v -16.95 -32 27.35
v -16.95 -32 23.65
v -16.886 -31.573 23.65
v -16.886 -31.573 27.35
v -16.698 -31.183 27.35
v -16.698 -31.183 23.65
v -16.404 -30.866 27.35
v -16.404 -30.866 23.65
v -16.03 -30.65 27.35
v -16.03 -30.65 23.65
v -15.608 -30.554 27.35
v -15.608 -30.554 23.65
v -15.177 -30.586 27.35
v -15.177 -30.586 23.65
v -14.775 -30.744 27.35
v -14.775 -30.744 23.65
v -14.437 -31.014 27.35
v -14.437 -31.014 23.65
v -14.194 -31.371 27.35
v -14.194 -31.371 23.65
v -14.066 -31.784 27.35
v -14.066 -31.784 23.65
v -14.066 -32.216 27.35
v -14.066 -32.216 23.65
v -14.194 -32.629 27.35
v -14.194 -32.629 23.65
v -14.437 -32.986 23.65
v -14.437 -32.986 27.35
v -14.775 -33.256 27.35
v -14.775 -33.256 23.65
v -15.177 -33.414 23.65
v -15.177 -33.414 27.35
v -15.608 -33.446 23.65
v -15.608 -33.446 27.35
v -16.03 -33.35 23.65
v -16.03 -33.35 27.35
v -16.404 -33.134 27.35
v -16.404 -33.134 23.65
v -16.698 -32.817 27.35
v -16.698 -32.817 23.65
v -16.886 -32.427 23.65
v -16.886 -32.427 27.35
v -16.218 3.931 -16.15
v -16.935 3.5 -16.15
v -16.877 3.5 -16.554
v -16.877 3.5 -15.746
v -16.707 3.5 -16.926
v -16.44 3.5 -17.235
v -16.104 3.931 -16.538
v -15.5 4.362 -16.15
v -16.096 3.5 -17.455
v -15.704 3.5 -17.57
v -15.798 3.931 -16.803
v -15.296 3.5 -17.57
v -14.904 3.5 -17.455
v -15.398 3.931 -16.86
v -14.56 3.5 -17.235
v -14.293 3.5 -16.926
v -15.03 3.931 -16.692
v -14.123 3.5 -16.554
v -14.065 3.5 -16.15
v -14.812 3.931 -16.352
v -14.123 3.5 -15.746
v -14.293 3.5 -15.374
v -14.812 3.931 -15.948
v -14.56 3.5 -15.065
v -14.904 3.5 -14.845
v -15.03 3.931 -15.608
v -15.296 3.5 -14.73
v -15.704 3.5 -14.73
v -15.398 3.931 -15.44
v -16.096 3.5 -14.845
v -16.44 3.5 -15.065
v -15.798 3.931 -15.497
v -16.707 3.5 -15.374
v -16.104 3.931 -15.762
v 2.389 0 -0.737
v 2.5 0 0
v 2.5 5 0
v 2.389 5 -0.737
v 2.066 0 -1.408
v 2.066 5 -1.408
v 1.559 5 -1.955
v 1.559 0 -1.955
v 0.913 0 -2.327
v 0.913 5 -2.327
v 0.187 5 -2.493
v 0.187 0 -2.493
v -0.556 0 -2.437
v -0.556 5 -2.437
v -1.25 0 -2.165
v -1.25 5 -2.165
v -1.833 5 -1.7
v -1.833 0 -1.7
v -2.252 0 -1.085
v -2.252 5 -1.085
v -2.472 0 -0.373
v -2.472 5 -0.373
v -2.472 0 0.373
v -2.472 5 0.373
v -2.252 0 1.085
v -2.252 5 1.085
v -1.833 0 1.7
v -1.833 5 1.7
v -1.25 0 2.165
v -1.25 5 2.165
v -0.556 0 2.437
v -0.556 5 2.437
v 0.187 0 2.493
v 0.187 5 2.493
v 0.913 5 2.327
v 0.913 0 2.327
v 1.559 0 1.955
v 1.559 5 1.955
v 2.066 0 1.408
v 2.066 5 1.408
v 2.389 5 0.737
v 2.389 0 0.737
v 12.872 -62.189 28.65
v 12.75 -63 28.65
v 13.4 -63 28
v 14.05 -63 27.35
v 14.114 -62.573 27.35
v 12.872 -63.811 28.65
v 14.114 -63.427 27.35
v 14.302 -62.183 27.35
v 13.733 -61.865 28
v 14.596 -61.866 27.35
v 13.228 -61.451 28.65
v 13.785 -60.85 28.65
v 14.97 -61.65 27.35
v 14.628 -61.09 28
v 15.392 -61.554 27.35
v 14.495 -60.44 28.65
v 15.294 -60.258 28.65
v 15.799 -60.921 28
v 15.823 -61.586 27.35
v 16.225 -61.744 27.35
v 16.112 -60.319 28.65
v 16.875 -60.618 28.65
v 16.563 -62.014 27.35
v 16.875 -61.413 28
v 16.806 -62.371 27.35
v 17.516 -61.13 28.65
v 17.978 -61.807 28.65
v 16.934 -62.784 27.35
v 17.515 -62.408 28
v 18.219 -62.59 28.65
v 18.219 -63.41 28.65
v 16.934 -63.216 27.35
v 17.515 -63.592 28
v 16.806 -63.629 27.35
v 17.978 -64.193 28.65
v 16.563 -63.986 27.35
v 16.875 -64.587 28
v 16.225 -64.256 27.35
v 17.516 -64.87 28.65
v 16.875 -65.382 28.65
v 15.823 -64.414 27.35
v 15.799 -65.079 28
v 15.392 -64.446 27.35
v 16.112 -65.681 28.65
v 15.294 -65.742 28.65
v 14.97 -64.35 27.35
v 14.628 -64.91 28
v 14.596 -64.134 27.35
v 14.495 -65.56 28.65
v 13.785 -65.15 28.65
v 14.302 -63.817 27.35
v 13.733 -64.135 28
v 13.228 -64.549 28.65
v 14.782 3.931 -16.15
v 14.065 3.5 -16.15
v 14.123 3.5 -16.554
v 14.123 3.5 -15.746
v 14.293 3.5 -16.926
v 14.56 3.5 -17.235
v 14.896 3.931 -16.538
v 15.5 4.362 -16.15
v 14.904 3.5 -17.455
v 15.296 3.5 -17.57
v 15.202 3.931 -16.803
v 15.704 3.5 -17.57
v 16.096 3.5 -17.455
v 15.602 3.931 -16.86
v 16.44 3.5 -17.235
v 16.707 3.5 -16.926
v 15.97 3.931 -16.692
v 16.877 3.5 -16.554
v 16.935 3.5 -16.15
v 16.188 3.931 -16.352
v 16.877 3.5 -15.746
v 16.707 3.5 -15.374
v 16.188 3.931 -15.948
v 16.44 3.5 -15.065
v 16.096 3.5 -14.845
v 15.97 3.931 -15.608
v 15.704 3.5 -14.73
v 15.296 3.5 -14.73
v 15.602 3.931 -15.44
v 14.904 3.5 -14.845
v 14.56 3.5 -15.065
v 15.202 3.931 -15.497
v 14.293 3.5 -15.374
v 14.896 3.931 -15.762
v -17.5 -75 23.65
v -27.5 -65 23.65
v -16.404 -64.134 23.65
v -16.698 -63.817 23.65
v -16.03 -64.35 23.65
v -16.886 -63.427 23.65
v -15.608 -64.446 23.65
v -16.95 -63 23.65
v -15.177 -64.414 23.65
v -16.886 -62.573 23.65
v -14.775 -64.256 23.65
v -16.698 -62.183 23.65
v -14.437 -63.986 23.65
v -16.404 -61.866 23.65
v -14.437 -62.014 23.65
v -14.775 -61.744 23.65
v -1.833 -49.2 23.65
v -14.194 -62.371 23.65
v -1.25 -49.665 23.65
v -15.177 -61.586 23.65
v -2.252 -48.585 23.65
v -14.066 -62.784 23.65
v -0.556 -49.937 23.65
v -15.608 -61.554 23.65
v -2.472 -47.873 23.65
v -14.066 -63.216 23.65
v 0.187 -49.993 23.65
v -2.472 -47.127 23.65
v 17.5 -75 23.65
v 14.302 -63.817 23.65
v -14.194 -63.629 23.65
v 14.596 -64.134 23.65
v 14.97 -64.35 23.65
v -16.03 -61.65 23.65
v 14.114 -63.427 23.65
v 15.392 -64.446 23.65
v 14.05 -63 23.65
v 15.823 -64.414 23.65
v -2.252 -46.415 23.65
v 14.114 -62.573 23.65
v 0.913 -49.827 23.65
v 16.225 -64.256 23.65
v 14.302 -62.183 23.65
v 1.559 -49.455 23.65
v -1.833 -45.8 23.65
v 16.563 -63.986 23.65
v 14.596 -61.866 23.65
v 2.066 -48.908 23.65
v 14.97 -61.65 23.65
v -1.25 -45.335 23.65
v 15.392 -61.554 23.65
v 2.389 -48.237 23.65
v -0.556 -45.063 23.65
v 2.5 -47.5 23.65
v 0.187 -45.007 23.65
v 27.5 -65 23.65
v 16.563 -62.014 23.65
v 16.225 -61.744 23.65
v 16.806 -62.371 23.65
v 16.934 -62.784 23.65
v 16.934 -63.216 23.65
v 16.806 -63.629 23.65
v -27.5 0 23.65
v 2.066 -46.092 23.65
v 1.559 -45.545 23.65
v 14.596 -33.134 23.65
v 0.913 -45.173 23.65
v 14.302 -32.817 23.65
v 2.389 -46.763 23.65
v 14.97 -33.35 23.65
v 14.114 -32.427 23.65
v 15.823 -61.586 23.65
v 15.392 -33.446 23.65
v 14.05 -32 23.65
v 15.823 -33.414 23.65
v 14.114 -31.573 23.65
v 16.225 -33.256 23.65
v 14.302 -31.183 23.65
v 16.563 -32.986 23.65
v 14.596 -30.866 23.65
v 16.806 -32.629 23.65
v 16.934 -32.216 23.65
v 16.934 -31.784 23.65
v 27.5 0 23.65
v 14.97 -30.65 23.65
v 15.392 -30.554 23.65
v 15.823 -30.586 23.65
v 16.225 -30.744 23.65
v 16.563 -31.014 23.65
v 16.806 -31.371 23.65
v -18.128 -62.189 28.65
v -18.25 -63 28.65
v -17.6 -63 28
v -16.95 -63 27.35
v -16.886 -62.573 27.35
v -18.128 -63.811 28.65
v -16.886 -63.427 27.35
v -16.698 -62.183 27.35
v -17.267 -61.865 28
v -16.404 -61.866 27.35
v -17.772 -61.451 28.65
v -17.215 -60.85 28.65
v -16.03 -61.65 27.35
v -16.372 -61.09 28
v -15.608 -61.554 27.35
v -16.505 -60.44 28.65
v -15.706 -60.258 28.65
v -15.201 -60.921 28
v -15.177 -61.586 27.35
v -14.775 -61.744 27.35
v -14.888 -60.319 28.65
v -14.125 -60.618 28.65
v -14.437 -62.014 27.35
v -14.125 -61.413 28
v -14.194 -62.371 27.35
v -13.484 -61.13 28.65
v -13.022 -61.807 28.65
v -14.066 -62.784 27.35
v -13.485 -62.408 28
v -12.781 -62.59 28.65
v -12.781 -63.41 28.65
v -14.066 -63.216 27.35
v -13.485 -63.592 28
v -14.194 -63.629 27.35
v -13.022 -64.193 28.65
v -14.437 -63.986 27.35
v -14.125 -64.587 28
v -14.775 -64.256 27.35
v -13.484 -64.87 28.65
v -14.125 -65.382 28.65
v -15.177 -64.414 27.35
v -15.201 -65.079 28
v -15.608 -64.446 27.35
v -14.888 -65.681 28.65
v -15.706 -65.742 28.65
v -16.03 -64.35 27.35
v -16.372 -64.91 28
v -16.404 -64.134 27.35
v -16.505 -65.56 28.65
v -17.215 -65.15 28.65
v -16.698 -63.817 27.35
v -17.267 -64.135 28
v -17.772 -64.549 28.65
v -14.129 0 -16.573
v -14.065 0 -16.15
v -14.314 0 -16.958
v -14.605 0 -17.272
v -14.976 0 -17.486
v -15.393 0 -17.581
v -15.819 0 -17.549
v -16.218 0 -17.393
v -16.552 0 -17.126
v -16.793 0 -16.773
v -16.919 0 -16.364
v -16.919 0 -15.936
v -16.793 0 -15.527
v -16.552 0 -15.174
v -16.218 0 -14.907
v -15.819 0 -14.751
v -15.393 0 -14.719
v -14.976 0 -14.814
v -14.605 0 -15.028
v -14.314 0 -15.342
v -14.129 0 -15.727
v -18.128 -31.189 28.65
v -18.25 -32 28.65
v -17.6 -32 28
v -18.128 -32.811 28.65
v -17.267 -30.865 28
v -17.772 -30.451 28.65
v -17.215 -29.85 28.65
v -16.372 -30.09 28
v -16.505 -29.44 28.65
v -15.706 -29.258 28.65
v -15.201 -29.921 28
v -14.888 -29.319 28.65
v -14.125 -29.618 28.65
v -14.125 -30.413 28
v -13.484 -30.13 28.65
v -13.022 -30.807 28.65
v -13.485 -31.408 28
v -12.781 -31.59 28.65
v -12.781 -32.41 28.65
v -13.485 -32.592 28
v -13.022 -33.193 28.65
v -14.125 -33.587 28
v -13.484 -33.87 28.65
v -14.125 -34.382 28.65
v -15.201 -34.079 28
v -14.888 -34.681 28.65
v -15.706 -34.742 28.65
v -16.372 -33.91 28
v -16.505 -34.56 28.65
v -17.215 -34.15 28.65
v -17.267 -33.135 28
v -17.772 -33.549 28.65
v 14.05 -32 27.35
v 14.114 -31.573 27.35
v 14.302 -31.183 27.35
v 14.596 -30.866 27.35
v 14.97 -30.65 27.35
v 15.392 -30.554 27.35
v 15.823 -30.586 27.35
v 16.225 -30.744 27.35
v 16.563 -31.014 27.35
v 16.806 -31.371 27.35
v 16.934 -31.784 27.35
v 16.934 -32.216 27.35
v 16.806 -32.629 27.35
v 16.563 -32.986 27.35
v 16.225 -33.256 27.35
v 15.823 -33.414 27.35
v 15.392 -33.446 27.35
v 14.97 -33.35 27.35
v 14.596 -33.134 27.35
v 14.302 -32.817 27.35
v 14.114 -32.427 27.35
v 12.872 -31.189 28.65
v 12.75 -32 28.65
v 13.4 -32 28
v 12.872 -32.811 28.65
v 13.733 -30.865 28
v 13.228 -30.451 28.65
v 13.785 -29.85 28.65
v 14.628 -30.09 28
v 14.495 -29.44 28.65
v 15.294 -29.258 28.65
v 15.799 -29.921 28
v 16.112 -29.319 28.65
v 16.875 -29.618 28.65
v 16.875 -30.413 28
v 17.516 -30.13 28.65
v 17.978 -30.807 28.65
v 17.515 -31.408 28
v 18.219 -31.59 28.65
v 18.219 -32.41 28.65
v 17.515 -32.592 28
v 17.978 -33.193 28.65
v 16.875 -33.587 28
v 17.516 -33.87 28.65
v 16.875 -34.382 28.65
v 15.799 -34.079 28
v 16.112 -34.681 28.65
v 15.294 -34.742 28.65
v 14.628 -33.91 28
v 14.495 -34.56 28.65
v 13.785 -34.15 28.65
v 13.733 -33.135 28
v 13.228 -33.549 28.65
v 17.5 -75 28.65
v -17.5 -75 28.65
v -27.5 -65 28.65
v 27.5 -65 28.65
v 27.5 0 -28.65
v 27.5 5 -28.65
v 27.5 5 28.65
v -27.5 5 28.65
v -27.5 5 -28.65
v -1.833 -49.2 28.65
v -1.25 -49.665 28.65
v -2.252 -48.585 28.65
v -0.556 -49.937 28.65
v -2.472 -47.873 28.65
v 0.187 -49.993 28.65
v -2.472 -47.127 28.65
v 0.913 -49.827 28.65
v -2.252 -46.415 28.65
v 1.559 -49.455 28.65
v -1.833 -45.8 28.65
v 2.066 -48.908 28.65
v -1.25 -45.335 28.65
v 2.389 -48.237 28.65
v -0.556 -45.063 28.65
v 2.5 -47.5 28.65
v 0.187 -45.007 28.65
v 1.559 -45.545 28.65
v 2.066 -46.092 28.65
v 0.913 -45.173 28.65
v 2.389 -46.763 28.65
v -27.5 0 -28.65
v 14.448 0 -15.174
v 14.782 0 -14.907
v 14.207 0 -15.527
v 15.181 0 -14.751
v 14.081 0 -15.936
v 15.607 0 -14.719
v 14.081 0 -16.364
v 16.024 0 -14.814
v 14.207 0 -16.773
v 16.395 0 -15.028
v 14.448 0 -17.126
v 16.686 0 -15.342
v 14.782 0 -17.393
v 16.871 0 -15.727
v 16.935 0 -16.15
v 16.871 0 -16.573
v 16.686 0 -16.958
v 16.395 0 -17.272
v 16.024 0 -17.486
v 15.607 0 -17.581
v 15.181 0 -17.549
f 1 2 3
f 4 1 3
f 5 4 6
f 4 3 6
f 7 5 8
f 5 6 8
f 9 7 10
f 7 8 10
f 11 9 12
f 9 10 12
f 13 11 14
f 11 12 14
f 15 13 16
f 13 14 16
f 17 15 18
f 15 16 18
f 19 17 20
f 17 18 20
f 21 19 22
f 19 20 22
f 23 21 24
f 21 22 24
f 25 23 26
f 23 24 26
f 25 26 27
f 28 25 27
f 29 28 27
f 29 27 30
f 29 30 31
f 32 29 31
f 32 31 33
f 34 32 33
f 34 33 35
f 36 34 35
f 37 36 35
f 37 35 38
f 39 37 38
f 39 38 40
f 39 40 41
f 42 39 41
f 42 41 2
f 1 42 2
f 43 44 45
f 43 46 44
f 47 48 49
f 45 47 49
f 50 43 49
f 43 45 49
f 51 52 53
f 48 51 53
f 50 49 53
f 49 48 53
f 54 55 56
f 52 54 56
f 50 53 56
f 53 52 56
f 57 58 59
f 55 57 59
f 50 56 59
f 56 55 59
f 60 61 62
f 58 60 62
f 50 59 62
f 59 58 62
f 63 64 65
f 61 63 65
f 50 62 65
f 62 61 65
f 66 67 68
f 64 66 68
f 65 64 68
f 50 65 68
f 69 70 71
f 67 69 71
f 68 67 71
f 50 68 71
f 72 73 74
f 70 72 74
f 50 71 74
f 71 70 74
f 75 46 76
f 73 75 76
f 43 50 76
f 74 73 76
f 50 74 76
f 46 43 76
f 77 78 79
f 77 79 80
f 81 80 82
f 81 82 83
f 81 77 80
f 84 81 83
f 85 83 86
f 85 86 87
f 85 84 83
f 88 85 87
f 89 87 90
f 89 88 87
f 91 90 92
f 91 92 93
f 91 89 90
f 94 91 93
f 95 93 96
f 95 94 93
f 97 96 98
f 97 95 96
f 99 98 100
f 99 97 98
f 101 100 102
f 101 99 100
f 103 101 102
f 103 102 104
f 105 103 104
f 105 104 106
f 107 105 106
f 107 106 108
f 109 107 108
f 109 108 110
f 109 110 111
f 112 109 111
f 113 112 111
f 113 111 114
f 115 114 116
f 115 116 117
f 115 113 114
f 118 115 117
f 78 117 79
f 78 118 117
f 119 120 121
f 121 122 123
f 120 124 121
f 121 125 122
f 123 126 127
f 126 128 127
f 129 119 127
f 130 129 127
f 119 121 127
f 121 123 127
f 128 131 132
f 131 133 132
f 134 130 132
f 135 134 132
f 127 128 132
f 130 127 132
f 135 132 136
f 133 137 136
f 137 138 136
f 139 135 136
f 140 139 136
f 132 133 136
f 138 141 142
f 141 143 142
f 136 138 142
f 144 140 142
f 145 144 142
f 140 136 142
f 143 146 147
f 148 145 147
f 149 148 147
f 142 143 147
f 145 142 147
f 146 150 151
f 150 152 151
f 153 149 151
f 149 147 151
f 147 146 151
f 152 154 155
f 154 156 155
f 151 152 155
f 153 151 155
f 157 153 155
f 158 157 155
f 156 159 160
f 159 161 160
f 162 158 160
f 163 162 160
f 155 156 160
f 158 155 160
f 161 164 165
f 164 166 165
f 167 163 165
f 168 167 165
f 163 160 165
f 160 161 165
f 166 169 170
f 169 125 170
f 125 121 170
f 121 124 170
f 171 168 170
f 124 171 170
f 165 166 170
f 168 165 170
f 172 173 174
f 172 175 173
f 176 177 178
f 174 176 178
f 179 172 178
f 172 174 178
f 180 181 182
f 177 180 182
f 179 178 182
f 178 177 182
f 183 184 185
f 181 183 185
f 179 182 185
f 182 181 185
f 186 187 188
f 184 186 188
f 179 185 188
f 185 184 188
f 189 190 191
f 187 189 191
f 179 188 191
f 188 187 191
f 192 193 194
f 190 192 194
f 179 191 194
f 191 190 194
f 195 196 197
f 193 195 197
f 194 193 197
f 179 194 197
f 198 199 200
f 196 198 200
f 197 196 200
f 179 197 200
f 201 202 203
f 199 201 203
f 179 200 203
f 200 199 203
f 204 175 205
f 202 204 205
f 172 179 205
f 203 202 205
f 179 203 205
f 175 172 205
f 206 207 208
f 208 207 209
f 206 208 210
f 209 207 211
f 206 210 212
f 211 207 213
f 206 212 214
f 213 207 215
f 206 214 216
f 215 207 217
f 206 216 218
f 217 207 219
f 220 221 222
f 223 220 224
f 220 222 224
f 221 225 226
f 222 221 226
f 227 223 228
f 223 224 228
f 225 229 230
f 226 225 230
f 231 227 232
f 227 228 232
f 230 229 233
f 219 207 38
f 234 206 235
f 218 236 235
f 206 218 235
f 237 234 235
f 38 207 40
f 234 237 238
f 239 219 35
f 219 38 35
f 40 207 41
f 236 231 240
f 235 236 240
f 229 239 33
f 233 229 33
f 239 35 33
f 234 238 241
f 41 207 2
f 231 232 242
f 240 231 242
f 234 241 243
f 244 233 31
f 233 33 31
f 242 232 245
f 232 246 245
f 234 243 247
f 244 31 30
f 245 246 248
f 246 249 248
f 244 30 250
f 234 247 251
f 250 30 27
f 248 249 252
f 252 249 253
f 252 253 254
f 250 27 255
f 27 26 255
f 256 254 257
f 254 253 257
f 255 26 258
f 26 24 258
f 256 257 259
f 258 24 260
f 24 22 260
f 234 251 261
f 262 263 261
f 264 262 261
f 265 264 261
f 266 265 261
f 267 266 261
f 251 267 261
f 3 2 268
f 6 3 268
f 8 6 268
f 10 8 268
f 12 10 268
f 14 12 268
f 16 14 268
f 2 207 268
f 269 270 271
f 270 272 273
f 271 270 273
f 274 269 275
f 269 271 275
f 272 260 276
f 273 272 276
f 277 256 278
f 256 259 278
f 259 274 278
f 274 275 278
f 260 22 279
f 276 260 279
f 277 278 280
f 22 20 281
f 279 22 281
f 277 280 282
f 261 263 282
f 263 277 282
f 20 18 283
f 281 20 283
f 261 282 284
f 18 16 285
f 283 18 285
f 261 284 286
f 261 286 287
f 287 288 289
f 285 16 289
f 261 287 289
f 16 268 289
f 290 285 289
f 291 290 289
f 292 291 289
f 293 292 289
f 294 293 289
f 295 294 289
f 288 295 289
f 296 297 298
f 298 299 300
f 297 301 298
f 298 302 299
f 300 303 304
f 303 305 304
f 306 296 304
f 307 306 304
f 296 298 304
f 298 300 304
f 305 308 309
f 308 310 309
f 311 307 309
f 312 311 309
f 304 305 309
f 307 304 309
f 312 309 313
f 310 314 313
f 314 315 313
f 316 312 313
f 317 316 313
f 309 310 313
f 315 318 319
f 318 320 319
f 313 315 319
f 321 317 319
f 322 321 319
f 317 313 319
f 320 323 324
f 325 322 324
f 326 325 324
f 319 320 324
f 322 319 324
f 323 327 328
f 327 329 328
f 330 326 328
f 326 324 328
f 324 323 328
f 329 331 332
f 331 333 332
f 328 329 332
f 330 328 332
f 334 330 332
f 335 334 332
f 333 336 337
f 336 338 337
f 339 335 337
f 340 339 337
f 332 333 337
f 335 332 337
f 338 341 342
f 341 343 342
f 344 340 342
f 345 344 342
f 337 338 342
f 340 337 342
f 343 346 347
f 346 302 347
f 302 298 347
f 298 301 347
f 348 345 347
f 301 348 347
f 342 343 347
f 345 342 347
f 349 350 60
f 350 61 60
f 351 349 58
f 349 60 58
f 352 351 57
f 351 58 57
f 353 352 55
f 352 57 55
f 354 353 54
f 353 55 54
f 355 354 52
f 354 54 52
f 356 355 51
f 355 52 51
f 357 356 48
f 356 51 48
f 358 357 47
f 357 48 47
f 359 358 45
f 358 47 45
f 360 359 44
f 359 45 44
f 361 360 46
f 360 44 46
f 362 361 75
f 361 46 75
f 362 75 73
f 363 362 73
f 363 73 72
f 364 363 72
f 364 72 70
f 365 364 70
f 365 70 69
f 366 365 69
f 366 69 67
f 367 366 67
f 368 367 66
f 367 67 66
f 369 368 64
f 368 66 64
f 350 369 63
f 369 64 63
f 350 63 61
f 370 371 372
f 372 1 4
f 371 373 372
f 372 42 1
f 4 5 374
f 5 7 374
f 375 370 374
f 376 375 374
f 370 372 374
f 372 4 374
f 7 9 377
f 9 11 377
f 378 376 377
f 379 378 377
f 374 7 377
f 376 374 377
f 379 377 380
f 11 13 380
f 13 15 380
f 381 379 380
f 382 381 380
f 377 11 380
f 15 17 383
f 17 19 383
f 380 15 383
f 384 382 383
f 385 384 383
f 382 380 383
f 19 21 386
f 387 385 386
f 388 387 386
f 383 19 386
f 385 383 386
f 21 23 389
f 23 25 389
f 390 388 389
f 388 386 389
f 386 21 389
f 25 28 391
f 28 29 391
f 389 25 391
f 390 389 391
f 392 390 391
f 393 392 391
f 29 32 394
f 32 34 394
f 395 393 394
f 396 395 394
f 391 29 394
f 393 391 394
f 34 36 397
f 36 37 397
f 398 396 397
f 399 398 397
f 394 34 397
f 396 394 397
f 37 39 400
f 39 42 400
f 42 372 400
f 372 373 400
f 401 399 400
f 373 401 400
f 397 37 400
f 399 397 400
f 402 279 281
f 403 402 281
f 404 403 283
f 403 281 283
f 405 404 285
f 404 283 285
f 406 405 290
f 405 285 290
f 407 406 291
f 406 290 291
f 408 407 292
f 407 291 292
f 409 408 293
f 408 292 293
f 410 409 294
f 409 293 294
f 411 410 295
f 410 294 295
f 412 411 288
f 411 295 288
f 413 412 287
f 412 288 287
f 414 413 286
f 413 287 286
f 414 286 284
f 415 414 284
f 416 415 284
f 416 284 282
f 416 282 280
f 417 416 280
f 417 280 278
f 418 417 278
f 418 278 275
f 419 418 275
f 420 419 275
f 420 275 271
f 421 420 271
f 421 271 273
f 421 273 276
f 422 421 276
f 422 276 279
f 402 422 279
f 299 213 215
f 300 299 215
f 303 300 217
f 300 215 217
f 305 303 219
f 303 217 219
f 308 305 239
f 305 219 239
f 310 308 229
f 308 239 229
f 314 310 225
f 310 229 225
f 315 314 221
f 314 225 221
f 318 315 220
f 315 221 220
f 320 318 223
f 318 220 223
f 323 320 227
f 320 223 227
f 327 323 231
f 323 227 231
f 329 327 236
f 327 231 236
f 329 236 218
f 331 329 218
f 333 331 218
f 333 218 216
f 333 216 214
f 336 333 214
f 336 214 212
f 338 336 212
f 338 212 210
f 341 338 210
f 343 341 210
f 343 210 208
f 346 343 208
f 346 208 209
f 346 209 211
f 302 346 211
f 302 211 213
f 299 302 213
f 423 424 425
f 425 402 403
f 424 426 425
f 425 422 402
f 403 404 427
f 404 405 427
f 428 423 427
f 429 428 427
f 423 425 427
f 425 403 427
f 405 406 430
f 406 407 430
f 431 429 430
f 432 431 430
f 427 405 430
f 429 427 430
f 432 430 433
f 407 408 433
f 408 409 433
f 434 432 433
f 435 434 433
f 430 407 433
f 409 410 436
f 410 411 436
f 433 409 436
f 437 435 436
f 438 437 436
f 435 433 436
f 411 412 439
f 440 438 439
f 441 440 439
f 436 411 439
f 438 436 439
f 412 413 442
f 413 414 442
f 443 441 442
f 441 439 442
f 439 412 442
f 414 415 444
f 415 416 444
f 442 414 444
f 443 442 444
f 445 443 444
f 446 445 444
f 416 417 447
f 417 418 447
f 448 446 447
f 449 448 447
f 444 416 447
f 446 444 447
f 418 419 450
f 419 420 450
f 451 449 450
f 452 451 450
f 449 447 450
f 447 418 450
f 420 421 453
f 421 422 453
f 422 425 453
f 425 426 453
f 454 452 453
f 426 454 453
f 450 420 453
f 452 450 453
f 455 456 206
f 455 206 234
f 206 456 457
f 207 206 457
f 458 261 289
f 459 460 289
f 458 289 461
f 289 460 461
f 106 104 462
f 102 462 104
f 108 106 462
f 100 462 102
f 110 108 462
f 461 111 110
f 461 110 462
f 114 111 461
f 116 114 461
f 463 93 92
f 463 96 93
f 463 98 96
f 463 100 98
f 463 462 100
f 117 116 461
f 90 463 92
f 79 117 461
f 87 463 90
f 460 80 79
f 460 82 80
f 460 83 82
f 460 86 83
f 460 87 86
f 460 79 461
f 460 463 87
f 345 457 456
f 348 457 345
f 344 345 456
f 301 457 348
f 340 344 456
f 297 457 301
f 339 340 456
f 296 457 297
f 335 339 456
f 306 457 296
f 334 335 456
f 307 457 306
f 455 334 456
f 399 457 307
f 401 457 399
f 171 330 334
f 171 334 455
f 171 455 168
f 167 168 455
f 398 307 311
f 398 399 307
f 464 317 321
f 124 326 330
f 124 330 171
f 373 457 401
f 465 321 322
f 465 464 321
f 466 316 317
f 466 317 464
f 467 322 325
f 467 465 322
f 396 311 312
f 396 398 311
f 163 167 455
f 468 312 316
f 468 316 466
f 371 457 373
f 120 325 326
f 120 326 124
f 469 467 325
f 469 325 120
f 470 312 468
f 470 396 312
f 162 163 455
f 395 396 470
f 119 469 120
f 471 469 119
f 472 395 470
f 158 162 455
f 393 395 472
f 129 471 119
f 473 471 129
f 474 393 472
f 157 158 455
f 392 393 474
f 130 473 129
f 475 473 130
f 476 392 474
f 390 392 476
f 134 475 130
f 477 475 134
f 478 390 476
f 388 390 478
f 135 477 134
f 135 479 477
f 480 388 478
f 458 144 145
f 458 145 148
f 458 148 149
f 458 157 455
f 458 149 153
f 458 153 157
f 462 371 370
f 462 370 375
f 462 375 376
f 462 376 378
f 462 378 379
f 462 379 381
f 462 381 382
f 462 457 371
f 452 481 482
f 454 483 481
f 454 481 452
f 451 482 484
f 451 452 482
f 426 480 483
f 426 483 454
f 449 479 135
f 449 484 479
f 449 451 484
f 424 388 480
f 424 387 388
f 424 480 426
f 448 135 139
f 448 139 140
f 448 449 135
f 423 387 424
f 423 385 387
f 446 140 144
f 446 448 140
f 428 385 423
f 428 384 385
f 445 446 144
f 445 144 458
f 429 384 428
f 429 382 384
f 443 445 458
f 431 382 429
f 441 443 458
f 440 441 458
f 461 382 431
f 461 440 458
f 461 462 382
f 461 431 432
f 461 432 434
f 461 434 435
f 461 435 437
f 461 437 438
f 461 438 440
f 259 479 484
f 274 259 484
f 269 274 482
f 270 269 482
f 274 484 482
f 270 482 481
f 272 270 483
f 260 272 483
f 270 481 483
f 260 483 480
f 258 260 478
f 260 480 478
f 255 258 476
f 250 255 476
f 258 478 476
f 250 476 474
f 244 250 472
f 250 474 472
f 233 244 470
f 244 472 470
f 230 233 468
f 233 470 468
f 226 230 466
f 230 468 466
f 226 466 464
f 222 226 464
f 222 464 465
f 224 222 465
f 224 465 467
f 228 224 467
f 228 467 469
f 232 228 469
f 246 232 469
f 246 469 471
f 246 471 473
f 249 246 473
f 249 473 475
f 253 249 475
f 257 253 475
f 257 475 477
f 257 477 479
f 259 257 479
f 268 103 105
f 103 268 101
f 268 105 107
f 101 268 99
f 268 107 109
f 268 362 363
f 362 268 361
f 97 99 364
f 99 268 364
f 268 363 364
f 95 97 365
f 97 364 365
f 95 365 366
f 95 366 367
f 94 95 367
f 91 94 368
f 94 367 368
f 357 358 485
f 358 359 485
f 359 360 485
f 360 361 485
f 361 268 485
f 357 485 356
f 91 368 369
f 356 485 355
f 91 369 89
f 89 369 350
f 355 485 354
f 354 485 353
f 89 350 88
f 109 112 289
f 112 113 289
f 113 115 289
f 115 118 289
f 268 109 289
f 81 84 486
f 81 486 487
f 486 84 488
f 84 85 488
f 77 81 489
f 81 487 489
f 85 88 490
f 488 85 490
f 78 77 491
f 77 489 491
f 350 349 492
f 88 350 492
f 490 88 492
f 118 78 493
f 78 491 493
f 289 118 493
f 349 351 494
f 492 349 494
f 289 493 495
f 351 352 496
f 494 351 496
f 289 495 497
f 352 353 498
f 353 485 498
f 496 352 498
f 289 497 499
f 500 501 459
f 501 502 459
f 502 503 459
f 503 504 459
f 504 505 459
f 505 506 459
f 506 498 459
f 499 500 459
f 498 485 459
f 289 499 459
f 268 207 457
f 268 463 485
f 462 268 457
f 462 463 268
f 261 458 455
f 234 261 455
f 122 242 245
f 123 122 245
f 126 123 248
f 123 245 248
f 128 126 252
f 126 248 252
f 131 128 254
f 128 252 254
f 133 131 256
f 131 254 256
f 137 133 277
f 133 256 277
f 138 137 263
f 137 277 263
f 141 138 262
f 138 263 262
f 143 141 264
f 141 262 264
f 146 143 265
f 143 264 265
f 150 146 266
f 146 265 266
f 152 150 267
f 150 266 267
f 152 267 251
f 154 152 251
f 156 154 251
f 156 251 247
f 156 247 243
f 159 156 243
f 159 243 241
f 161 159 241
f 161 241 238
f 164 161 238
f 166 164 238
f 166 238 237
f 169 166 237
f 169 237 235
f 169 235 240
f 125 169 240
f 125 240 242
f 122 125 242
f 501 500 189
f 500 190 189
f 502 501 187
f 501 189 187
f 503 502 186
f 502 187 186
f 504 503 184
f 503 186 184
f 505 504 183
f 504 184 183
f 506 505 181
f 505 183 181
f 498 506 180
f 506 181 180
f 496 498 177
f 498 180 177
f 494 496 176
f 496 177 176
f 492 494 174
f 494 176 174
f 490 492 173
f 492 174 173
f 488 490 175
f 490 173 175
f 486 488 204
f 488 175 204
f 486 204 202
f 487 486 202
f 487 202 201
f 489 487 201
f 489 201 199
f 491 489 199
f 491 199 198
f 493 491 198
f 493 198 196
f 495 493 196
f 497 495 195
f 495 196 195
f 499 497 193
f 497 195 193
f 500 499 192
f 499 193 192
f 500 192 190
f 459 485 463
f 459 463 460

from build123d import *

# Parameters (mm, degrees)
SKETCH1_W                                         = 55
SKETCH1_H                                         = 57.3
SKETCH1_R                                         = 2.5
BOSS_EXTRUDE1_DEPTH                               = 5
SKETCH2_W                                         = 55
SKETCH2_H                                         = 5
BOSS_EXTRUDE2_DEPTH                               = 75
CUT_EXTRUDE1_REACH                                = 59.3
CUT_EXTRUDE2_REACH                                = 7
CUT_EXTRUDE3_REACH                                = 59.3
SKETCH5_R                                         = 2.5
CUT_EXTRUDE4_REACH                                = 59.3
SKETCH6_R                                         = 2.5
CUT_EXTRUDE5_REACH                                = 7
CSK_FOR_M2_5_FLAT_HEAD_MACHINE_SCREW1_D           = 2.9
CSK_FOR_M2_5_FLAT_HEAD_MACHINE_SCREW1_DEPTH       = 5
CSK_FOR_M2_5_FLAT_HEAD_MACHINE_SCREW1_CSINK_D     = 5.5
CSK_FOR_M2_5_FLAT_HEAD_MACHINE_SCREW1_CSINK_ANGLE = 90
F_6_40_TAPPED_HOLE1_D                             = 2.8702
F_6_40_TAPPED_HOLE1_DEPTH                         = 3.5
F_6_40_TAPPED_HOLE1_TIP                           = 0.862295074


with BuildPart() as part:
    # Sketch1 → Boss-Extrude1 (new body)
    with BuildSketch(Plane(origin=(0, 0, 0), x_dir=(1, 0, 0), z_dir=(0, 1, 0))):
        Rectangle(SKETCH1_W, SKETCH1_H)
        Circle(SKETCH1_R, mode=Mode.SUBTRACT)
    extrude(amount=BOSS_EXTRUDE1_DEPTH)

    # Sketch2 → Boss-Extrude2 (add)
    with BuildSketch(Plane.XZ):
        with Locations((0, 26.15)):
            Rectangle(SKETCH2_W, SKETCH2_H)
        with Locations((0, -26.15)):
            Rectangle(SKETCH2_W, SKETCH2_H)
    extrude(amount=BOSS_EXTRUDE2_DEPTH)

    # Sketch3 → Cut-Extrude1 (cut, up to next)
    with BuildSketch(Plane.XY.offset(28.65), mode=Mode.PRIVATE) as cut_extrude1_sk1:
        Polygon((-27.5, -75), (-17.5, -75), (-27.5, -65), align=None)
    cut_extrude1_tool1 = extrude(cut_extrude1_sk1.sketch, amount=-CUT_EXTRUDE1_REACH, mode=Mode.PRIVATE) & part.part
    add(cut_extrude1_tool1.solids().sort_by_distance((-24.166667, -71.666667, 28.65))[0], mode=Mode.SUBTRACT)
    # Sketch3 → Cut-Extrude1 (cut, up to next)
    with BuildSketch(Plane.XY.offset(28.65), mode=Mode.PRIVATE) as cut_extrude1_sk2:
        Polygon((27.5, -75), (27.5, -65), (17.5, -75), align=None)
    cut_extrude1_tool2 = extrude(cut_extrude1_sk2.sketch, amount=-CUT_EXTRUDE1_REACH, mode=Mode.PRIVATE) & part.part
    add(cut_extrude1_tool2.solids().sort_by_distance((24.166667, -71.666667, 28.65))[0], mode=Mode.SUBTRACT)

    # Sketch4 → Cut-Extrude2 (cut, up to next)
    with BuildSketch(Plane.XY.offset(-23.65), mode=Mode.PRIVATE) as cut_extrude2_sk1:
        Polygon((-27.5, -65), (-27.5, -75), (-17.5, -75), align=None)
    cut_extrude2_tool1 = extrude(cut_extrude2_sk1.sketch, amount=-CUT_EXTRUDE2_REACH, mode=Mode.PRIVATE) & part.part
    add(cut_extrude2_tool1.solids().sort_by_distance((-24.166667, -71.666667, -23.65))[0], mode=Mode.SUBTRACT)
    # Sketch4 → Cut-Extrude2 (cut, up to next)
    with BuildSketch(Plane.XY.offset(-23.65), mode=Mode.PRIVATE) as cut_extrude2_sk2:
        Polygon((27.5, -65), (17.5, -75), (27.5, -75), align=None)
    cut_extrude2_tool2 = extrude(cut_extrude2_sk2.sketch, amount=-CUT_EXTRUDE2_REACH, mode=Mode.PRIVATE) & part.part
    add(cut_extrude2_tool2.solids().sort_by_distance((24.166667, -71.666667, -23.65))[0], mode=Mode.SUBTRACT)

    # Sketch5 → Cut-Extrude3 (cut, up to next)
    with BuildSketch(Plane.XY.offset(28.65), mode=Mode.PRIVATE) as cut_extrude3_sk1:
        with Locations((0, -47.5)):
            Circle(SKETCH5_R)
    cut_extrude3_tool1 = extrude(cut_extrude3_sk1.sketch, amount=-CUT_EXTRUDE3_REACH, mode=Mode.PRIVATE) & part.part
    add(cut_extrude3_tool1.solids().sort_by_distance((0, -47.5, 28.65))[0], mode=Mode.SUBTRACT)

    # Sketch6 → Cut-Extrude4 (cut, up to next)
    with BuildSketch(Plane(origin=(0, 0, -28.65), x_dir=(-1, 0, 0), z_dir=(0, 0, -1)), mode=Mode.PRIVATE) as cut_extrude4_sk1:
        with Locations((0, -47.5)):
            Circle(SKETCH6_R)
    cut_extrude4_tool1 = extrude(cut_extrude4_sk1.sketch, amount=-CUT_EXTRUDE4_REACH, mode=Mode.PRIVATE) & part.part
    add(cut_extrude4_tool1.solids().sort_by_distance((0, -47.5, -28.65))[0], mode=Mode.SUBTRACT)

    # Sketch7 → Cut-Extrude5 (cut, up to next)
    with BuildSketch(Plane.XY.offset(-23.65), mode=Mode.PRIVATE) as cut_extrude5_sk1:
        Polygon((-27.5, 0), (27.5, 0), (27.5, -65), (17.5, -75), (-17.5, -75), (-27.5, -65), align=None)
    cut_extrude5_tool1 = extrude(cut_extrude5_sk1.sketch, amount=-CUT_EXTRUDE5_REACH, mode=Mode.PRIVATE) & part.part
    add(cut_extrude5_tool1.solids().sort_by_distance((0, -36.651139, -23.65))[0], mode=Mode.SUBTRACT)

    # CSK for M2.5 Flat Head Machine Screw1
    with Locations(Plane.XY.offset(28.65)):
        with Locations((-15.5, -32), (15.5, -32), (-15.5, -63), (15.5, -63)):
            CounterSinkHole(CSK_FOR_M2_5_FLAT_HEAD_MACHINE_SCREW1_D / 2, CSK_FOR_M2_5_FLAT_HEAD_MACHINE_SCREW1_CSINK_D / 2, depth=CSK_FOR_M2_5_FLAT_HEAD_MACHINE_SCREW1_DEPTH, counter_sink_angle=CSK_FOR_M2_5_FLAT_HEAD_MACHINE_SCREW1_CSINK_ANGLE)

    # #6-40 Tapped Hole1
    with Locations(Plane(origin=(0, 0, 0), x_dir=(-1, 0, 0), z_dir=(0, -1, 0))):
        with Locations((-15.5, 16.15), (15.5, 16.15)):
            Hole(F_6_40_TAPPED_HOLE1_D / 2, depth=F_6_40_TAPPED_HOLE1_DEPTH)
            with Locations((0, 0, -(F_6_40_TAPPED_HOLE1_DEPTH + F_6_40_TAPPED_HOLE1_TIP / 2))):  # 118° drill point
                Cone(0, F_6_40_TAPPED_HOLE1_D / 2, F_6_40_TAPPED_HOLE1_TIP, mode=Mode.SUBTRACT)


solid = part.part
